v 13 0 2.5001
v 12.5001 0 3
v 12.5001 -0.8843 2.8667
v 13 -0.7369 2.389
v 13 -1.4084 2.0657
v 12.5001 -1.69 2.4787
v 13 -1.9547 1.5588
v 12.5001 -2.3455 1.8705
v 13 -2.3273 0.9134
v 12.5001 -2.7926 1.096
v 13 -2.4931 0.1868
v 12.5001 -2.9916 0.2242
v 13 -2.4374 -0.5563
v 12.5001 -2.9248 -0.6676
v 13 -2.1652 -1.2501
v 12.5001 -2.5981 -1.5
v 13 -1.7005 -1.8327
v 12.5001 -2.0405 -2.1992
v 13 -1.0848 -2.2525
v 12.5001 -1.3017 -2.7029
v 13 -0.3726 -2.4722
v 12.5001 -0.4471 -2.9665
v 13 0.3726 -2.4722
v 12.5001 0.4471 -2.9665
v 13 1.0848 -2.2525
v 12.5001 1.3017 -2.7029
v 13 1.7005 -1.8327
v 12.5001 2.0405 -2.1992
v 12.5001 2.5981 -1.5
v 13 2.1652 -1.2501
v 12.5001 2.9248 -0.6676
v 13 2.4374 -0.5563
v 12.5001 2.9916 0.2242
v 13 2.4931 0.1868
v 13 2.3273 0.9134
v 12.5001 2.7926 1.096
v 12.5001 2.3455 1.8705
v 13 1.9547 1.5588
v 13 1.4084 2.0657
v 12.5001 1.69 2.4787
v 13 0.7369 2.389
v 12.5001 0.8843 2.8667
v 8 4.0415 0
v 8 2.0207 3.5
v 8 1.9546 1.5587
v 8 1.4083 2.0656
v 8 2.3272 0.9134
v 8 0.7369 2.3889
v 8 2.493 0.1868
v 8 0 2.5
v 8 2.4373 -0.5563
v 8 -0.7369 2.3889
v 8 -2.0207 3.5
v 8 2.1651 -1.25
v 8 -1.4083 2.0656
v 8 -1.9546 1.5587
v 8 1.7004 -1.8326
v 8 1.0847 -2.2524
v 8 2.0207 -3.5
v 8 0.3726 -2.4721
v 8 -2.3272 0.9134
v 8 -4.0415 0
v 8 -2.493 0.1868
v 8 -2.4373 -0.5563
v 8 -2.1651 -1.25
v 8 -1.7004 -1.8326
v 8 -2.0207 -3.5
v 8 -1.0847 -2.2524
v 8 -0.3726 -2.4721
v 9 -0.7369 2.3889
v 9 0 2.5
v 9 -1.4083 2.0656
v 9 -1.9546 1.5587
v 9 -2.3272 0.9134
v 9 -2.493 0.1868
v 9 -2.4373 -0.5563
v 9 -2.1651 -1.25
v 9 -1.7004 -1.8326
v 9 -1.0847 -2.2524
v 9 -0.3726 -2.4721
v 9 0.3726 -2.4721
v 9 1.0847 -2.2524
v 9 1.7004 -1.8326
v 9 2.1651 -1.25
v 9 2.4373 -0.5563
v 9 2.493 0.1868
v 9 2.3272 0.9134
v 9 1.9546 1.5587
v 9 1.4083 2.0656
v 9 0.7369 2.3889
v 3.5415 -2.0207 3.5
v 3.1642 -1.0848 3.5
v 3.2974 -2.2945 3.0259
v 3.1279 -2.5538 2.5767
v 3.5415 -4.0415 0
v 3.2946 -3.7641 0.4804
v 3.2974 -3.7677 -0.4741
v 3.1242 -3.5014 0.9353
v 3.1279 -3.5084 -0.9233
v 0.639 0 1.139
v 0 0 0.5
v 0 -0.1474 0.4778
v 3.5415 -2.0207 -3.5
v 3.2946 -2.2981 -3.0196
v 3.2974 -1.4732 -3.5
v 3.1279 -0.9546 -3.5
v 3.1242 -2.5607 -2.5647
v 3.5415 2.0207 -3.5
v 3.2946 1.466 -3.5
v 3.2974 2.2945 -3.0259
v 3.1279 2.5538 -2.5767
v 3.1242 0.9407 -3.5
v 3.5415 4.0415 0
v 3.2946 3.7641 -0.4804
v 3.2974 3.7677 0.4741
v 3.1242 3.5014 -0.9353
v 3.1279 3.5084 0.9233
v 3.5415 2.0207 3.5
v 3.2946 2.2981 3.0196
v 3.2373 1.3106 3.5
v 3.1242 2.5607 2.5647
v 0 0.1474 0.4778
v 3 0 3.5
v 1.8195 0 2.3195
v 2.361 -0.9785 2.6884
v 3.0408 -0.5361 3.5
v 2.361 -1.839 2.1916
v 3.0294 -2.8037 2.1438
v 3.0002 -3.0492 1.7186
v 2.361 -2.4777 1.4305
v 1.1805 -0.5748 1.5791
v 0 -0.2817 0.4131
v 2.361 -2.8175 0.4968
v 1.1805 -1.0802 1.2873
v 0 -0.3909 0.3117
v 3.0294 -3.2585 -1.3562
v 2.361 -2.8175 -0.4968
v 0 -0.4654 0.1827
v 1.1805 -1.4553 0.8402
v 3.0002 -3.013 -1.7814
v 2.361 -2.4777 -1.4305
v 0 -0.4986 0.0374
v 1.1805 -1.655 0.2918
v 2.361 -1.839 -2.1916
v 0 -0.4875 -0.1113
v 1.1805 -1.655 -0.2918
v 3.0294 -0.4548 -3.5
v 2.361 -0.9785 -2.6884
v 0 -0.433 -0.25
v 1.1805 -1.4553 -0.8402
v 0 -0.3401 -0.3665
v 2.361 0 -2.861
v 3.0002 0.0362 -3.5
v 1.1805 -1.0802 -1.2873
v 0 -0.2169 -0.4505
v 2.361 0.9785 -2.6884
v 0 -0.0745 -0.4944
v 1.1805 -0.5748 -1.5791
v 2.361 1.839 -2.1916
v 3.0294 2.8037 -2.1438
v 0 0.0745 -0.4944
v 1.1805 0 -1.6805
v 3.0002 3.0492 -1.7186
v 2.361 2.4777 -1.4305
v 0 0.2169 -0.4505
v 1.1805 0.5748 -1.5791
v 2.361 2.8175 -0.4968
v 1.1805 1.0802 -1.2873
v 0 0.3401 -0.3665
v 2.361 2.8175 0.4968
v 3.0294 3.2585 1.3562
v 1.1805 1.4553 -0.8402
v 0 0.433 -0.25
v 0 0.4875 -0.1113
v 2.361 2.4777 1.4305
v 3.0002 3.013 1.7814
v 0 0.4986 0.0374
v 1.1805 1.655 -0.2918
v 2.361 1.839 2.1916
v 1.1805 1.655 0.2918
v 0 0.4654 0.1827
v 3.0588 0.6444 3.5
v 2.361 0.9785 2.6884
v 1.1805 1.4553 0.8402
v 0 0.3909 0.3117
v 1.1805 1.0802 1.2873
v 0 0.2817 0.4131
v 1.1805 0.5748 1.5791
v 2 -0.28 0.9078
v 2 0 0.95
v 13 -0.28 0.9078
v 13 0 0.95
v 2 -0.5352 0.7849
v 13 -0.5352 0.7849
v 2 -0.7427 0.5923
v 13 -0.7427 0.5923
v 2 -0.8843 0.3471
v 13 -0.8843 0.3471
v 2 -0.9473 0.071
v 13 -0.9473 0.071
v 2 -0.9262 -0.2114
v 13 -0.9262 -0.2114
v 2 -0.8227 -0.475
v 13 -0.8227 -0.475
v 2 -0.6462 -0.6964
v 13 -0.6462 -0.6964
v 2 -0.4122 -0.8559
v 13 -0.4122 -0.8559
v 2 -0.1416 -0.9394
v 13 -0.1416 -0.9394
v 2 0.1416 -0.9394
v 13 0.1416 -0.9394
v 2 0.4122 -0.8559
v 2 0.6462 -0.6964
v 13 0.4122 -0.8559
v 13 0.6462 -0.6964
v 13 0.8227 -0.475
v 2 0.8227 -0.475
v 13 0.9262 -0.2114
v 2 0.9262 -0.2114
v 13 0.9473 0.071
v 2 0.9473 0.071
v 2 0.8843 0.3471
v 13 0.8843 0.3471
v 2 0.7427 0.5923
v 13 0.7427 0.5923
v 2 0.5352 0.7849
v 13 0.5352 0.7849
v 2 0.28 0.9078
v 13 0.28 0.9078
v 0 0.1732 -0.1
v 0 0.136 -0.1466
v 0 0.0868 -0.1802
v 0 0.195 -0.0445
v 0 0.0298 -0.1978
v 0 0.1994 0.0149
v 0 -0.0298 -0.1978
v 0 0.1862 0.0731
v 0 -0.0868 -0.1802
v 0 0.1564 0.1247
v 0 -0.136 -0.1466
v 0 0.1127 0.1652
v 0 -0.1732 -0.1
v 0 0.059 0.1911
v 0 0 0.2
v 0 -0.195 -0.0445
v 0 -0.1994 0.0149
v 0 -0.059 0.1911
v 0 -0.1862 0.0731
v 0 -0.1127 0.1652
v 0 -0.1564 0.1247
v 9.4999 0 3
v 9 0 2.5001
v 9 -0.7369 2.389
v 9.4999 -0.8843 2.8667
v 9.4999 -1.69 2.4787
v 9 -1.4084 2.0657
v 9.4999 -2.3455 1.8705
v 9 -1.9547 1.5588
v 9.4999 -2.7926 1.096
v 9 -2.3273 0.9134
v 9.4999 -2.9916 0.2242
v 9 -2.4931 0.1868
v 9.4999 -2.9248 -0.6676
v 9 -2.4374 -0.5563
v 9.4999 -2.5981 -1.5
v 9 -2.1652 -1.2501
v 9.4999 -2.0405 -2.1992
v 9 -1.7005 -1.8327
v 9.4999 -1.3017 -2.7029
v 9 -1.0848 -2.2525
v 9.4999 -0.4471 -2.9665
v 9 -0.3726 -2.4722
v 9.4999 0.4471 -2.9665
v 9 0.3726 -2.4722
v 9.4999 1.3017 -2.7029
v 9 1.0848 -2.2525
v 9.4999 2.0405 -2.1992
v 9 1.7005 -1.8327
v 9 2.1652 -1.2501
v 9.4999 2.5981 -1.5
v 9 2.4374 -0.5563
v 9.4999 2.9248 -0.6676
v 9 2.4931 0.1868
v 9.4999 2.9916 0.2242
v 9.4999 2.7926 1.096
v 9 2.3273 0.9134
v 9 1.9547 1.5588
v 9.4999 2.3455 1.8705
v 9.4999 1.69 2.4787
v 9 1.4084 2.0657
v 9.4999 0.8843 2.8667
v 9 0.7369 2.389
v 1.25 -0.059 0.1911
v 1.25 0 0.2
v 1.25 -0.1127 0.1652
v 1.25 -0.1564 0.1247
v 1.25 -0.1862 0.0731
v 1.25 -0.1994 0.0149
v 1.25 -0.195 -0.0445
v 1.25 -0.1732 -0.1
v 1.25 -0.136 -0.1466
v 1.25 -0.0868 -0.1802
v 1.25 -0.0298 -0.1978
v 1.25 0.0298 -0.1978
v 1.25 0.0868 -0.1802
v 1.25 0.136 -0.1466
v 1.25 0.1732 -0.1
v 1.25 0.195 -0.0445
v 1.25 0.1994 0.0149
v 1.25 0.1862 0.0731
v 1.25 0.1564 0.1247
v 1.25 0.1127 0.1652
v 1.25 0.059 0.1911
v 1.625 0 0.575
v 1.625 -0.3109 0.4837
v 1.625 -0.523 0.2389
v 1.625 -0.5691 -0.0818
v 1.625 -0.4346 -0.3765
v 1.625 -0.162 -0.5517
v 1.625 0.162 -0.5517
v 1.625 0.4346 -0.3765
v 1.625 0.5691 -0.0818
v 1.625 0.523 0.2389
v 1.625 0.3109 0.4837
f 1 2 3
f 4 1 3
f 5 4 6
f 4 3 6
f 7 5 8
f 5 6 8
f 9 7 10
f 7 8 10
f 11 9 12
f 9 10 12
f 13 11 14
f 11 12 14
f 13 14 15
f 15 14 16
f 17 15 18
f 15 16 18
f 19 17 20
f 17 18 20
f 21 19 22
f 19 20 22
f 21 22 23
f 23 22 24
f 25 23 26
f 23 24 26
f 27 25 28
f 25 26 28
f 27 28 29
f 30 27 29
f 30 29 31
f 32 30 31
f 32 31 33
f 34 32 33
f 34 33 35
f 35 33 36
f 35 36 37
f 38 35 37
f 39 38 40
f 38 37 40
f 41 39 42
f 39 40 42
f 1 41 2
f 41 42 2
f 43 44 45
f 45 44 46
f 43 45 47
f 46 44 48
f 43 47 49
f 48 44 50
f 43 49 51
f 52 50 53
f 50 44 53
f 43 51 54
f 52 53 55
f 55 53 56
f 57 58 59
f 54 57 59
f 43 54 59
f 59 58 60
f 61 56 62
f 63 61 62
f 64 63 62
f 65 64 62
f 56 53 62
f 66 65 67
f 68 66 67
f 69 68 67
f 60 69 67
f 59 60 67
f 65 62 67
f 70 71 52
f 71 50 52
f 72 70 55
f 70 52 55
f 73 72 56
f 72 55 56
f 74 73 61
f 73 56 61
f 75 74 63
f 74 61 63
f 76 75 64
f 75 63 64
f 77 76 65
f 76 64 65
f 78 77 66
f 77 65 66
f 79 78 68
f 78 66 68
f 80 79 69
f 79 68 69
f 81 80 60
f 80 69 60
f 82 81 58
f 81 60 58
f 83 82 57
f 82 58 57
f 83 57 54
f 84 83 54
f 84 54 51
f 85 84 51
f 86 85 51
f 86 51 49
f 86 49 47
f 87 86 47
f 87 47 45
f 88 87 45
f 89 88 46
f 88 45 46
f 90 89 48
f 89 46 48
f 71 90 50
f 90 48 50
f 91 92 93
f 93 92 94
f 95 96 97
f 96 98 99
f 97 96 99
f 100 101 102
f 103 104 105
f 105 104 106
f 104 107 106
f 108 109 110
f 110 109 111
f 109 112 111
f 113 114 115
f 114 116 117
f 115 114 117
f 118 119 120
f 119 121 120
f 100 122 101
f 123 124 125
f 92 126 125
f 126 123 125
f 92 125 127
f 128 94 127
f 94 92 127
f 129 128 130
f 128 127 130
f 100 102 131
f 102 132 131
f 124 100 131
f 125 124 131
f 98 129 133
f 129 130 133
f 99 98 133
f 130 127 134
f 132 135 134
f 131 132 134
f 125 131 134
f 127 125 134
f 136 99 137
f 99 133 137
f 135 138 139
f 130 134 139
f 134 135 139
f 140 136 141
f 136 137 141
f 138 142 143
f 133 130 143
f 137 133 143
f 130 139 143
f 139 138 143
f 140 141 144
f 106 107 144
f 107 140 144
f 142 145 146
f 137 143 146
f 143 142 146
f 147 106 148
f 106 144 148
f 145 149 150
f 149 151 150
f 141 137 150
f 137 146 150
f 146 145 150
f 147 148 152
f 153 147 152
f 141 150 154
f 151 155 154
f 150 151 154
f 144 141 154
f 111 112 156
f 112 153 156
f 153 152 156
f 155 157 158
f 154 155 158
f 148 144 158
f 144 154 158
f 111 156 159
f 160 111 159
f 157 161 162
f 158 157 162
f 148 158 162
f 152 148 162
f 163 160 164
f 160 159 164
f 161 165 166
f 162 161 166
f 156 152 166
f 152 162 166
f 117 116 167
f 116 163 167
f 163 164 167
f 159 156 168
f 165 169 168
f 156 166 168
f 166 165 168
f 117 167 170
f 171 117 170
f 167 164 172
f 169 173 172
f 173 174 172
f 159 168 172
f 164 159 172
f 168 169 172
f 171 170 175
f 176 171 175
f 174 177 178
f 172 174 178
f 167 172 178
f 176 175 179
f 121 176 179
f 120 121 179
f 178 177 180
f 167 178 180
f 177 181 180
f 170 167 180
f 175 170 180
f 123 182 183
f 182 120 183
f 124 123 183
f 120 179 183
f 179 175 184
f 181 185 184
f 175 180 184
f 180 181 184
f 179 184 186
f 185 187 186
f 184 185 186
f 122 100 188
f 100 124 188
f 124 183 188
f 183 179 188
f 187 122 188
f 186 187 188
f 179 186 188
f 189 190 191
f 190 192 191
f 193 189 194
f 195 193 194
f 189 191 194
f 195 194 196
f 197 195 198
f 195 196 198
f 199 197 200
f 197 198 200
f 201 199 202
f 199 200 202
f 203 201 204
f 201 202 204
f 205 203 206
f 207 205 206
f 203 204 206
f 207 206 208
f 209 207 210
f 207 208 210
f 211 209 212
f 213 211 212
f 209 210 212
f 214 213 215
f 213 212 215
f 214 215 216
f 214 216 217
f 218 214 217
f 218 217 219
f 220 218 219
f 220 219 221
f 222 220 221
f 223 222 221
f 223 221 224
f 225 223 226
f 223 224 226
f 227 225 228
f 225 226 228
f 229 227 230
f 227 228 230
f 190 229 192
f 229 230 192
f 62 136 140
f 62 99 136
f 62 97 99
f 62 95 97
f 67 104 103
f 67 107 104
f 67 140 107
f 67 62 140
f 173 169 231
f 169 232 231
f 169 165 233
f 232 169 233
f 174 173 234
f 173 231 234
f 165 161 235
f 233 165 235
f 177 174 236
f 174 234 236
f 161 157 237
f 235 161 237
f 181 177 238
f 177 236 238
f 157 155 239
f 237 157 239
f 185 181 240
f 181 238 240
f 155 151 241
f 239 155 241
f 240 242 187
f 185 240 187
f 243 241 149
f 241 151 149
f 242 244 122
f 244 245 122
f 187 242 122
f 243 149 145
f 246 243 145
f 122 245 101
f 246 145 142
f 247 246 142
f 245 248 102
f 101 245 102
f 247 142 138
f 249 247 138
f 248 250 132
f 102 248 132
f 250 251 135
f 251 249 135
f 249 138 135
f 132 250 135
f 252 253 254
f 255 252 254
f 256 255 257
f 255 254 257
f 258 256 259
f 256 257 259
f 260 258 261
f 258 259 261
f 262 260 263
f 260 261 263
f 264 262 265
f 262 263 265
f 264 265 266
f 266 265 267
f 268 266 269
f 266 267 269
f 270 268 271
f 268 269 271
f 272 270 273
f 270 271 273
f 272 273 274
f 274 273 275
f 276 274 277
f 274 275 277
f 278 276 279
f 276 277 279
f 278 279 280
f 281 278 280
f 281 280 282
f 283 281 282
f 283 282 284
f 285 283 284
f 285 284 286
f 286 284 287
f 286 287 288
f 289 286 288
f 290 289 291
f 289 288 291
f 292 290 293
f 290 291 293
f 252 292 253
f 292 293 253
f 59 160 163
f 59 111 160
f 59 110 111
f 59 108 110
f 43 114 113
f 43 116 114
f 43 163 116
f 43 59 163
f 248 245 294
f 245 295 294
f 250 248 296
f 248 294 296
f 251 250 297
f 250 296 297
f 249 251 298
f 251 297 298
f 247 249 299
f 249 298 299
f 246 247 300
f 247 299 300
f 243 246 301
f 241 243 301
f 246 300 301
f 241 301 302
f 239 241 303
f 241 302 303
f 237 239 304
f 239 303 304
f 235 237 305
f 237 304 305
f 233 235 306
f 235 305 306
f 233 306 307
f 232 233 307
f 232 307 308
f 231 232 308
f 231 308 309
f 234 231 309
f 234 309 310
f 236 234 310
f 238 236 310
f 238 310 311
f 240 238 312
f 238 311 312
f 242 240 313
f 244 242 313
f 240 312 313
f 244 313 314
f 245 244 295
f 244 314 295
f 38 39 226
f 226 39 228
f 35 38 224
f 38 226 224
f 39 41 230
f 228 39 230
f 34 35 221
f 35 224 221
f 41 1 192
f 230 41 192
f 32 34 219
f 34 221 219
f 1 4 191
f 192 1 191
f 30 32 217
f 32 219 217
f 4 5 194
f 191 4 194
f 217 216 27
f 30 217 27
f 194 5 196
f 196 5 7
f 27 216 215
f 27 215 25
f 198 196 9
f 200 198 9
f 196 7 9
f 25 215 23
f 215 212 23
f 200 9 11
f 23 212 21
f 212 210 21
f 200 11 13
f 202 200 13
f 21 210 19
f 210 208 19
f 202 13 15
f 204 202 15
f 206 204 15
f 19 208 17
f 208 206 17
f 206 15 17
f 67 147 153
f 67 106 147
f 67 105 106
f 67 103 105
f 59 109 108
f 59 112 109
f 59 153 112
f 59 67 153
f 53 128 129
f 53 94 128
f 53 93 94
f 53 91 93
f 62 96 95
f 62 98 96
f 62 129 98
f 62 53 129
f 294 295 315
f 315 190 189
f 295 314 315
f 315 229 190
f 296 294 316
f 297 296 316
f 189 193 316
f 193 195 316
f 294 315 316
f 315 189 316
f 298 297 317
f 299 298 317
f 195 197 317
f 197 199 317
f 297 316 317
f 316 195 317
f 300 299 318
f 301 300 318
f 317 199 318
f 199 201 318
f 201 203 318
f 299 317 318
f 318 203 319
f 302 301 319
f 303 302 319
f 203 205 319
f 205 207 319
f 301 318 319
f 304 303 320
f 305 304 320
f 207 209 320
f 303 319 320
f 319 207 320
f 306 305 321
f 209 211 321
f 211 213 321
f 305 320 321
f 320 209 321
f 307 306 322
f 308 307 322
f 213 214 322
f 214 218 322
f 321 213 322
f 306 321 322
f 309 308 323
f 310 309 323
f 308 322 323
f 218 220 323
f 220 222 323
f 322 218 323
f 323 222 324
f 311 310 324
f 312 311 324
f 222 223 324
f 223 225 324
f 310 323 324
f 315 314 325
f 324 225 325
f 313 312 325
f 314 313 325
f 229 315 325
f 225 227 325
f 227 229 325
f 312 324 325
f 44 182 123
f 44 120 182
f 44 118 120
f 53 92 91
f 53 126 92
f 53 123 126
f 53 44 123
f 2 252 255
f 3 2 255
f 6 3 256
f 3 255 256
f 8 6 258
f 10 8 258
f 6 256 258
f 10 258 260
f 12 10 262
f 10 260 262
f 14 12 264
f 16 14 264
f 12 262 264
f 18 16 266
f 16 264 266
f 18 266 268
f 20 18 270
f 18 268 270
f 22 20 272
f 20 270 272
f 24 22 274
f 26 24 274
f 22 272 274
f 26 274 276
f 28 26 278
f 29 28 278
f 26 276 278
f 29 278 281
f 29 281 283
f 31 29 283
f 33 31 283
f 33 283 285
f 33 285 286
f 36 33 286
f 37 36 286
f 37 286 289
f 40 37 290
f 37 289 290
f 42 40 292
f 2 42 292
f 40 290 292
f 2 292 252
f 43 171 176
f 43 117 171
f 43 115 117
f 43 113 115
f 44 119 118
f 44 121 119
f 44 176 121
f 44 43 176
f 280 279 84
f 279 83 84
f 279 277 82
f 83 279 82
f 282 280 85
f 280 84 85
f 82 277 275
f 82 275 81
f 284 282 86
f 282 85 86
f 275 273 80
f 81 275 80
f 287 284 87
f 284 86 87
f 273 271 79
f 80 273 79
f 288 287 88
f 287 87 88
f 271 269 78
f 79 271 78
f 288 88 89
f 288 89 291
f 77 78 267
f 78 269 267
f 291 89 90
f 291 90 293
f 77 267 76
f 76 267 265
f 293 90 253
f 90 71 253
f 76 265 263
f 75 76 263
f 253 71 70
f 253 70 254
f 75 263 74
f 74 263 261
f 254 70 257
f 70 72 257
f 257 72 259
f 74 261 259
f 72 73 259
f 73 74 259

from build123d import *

# Parameters (mm, degrees)
ESQUISSE2_OUTSIDE_W     = 14.638
ESQUISSE2_OUTSIDE_H     = 14.638
ENL_V_MAT_EXTRU_1_DEPTH = 10
CHANFREIN1_SIZE         = 0.5


with BuildPart() as part:
    # Esquisse1 → Révolution1 (revolve)
    with BuildSketch(Plane.XY, mode=Mode.PRIVATE) as r_volution1_sk:
        Polygon((1.25, 0.2), (2, 0.95), (13, 0.95), (13, 3), (9, 3), (9, 2.5), (8, 2.5), (8, 4.5), (4, 4.5), (0, 0.5), (0, 0.2), align=None)
    revolve(r_volution1_sk.sketch.rotate(Axis((0, 0, 0), (1, 0, 0)), 90), axis=Axis((0, 0, 0), (1, 0, 0)))

    # Esquisse2 outside → Enlèv. mat.-Extru.1 (cut)
    with BuildSketch(Plane(origin=(8, 0, 0), x_dir=(0, 0, -1), z_dir=(1, 0, 0))):
        Rectangle(ESQUISSE2_OUTSIDE_W, ESQUISSE2_OUTSIDE_H)
        Polygon((-3.5, -2.020725942), (0, -4.041451884), (3.5, -2.020725942), (3.5, 2.020725942), (0, 4.041451884), (-3.5, 2.020725942), align=None, mode=Mode.SUBTRACT)
    extrude(amount=-ENL_V_MAT_EXTRU_1_DEPTH, mode=Mode.SUBTRACT)

    # Chanfrein1
    chanfrein1_edges = [part.edges().sort_by_distance(p)[0] for p in [
        (9, 0, -3),
        (13, 0, -3),
    ]]
    chamfer(chanfrein1_edges, length=CHANFREIN1_SIZE - 0.0001)  # a hair under: the kernel refuses the full size


solid = part.part
